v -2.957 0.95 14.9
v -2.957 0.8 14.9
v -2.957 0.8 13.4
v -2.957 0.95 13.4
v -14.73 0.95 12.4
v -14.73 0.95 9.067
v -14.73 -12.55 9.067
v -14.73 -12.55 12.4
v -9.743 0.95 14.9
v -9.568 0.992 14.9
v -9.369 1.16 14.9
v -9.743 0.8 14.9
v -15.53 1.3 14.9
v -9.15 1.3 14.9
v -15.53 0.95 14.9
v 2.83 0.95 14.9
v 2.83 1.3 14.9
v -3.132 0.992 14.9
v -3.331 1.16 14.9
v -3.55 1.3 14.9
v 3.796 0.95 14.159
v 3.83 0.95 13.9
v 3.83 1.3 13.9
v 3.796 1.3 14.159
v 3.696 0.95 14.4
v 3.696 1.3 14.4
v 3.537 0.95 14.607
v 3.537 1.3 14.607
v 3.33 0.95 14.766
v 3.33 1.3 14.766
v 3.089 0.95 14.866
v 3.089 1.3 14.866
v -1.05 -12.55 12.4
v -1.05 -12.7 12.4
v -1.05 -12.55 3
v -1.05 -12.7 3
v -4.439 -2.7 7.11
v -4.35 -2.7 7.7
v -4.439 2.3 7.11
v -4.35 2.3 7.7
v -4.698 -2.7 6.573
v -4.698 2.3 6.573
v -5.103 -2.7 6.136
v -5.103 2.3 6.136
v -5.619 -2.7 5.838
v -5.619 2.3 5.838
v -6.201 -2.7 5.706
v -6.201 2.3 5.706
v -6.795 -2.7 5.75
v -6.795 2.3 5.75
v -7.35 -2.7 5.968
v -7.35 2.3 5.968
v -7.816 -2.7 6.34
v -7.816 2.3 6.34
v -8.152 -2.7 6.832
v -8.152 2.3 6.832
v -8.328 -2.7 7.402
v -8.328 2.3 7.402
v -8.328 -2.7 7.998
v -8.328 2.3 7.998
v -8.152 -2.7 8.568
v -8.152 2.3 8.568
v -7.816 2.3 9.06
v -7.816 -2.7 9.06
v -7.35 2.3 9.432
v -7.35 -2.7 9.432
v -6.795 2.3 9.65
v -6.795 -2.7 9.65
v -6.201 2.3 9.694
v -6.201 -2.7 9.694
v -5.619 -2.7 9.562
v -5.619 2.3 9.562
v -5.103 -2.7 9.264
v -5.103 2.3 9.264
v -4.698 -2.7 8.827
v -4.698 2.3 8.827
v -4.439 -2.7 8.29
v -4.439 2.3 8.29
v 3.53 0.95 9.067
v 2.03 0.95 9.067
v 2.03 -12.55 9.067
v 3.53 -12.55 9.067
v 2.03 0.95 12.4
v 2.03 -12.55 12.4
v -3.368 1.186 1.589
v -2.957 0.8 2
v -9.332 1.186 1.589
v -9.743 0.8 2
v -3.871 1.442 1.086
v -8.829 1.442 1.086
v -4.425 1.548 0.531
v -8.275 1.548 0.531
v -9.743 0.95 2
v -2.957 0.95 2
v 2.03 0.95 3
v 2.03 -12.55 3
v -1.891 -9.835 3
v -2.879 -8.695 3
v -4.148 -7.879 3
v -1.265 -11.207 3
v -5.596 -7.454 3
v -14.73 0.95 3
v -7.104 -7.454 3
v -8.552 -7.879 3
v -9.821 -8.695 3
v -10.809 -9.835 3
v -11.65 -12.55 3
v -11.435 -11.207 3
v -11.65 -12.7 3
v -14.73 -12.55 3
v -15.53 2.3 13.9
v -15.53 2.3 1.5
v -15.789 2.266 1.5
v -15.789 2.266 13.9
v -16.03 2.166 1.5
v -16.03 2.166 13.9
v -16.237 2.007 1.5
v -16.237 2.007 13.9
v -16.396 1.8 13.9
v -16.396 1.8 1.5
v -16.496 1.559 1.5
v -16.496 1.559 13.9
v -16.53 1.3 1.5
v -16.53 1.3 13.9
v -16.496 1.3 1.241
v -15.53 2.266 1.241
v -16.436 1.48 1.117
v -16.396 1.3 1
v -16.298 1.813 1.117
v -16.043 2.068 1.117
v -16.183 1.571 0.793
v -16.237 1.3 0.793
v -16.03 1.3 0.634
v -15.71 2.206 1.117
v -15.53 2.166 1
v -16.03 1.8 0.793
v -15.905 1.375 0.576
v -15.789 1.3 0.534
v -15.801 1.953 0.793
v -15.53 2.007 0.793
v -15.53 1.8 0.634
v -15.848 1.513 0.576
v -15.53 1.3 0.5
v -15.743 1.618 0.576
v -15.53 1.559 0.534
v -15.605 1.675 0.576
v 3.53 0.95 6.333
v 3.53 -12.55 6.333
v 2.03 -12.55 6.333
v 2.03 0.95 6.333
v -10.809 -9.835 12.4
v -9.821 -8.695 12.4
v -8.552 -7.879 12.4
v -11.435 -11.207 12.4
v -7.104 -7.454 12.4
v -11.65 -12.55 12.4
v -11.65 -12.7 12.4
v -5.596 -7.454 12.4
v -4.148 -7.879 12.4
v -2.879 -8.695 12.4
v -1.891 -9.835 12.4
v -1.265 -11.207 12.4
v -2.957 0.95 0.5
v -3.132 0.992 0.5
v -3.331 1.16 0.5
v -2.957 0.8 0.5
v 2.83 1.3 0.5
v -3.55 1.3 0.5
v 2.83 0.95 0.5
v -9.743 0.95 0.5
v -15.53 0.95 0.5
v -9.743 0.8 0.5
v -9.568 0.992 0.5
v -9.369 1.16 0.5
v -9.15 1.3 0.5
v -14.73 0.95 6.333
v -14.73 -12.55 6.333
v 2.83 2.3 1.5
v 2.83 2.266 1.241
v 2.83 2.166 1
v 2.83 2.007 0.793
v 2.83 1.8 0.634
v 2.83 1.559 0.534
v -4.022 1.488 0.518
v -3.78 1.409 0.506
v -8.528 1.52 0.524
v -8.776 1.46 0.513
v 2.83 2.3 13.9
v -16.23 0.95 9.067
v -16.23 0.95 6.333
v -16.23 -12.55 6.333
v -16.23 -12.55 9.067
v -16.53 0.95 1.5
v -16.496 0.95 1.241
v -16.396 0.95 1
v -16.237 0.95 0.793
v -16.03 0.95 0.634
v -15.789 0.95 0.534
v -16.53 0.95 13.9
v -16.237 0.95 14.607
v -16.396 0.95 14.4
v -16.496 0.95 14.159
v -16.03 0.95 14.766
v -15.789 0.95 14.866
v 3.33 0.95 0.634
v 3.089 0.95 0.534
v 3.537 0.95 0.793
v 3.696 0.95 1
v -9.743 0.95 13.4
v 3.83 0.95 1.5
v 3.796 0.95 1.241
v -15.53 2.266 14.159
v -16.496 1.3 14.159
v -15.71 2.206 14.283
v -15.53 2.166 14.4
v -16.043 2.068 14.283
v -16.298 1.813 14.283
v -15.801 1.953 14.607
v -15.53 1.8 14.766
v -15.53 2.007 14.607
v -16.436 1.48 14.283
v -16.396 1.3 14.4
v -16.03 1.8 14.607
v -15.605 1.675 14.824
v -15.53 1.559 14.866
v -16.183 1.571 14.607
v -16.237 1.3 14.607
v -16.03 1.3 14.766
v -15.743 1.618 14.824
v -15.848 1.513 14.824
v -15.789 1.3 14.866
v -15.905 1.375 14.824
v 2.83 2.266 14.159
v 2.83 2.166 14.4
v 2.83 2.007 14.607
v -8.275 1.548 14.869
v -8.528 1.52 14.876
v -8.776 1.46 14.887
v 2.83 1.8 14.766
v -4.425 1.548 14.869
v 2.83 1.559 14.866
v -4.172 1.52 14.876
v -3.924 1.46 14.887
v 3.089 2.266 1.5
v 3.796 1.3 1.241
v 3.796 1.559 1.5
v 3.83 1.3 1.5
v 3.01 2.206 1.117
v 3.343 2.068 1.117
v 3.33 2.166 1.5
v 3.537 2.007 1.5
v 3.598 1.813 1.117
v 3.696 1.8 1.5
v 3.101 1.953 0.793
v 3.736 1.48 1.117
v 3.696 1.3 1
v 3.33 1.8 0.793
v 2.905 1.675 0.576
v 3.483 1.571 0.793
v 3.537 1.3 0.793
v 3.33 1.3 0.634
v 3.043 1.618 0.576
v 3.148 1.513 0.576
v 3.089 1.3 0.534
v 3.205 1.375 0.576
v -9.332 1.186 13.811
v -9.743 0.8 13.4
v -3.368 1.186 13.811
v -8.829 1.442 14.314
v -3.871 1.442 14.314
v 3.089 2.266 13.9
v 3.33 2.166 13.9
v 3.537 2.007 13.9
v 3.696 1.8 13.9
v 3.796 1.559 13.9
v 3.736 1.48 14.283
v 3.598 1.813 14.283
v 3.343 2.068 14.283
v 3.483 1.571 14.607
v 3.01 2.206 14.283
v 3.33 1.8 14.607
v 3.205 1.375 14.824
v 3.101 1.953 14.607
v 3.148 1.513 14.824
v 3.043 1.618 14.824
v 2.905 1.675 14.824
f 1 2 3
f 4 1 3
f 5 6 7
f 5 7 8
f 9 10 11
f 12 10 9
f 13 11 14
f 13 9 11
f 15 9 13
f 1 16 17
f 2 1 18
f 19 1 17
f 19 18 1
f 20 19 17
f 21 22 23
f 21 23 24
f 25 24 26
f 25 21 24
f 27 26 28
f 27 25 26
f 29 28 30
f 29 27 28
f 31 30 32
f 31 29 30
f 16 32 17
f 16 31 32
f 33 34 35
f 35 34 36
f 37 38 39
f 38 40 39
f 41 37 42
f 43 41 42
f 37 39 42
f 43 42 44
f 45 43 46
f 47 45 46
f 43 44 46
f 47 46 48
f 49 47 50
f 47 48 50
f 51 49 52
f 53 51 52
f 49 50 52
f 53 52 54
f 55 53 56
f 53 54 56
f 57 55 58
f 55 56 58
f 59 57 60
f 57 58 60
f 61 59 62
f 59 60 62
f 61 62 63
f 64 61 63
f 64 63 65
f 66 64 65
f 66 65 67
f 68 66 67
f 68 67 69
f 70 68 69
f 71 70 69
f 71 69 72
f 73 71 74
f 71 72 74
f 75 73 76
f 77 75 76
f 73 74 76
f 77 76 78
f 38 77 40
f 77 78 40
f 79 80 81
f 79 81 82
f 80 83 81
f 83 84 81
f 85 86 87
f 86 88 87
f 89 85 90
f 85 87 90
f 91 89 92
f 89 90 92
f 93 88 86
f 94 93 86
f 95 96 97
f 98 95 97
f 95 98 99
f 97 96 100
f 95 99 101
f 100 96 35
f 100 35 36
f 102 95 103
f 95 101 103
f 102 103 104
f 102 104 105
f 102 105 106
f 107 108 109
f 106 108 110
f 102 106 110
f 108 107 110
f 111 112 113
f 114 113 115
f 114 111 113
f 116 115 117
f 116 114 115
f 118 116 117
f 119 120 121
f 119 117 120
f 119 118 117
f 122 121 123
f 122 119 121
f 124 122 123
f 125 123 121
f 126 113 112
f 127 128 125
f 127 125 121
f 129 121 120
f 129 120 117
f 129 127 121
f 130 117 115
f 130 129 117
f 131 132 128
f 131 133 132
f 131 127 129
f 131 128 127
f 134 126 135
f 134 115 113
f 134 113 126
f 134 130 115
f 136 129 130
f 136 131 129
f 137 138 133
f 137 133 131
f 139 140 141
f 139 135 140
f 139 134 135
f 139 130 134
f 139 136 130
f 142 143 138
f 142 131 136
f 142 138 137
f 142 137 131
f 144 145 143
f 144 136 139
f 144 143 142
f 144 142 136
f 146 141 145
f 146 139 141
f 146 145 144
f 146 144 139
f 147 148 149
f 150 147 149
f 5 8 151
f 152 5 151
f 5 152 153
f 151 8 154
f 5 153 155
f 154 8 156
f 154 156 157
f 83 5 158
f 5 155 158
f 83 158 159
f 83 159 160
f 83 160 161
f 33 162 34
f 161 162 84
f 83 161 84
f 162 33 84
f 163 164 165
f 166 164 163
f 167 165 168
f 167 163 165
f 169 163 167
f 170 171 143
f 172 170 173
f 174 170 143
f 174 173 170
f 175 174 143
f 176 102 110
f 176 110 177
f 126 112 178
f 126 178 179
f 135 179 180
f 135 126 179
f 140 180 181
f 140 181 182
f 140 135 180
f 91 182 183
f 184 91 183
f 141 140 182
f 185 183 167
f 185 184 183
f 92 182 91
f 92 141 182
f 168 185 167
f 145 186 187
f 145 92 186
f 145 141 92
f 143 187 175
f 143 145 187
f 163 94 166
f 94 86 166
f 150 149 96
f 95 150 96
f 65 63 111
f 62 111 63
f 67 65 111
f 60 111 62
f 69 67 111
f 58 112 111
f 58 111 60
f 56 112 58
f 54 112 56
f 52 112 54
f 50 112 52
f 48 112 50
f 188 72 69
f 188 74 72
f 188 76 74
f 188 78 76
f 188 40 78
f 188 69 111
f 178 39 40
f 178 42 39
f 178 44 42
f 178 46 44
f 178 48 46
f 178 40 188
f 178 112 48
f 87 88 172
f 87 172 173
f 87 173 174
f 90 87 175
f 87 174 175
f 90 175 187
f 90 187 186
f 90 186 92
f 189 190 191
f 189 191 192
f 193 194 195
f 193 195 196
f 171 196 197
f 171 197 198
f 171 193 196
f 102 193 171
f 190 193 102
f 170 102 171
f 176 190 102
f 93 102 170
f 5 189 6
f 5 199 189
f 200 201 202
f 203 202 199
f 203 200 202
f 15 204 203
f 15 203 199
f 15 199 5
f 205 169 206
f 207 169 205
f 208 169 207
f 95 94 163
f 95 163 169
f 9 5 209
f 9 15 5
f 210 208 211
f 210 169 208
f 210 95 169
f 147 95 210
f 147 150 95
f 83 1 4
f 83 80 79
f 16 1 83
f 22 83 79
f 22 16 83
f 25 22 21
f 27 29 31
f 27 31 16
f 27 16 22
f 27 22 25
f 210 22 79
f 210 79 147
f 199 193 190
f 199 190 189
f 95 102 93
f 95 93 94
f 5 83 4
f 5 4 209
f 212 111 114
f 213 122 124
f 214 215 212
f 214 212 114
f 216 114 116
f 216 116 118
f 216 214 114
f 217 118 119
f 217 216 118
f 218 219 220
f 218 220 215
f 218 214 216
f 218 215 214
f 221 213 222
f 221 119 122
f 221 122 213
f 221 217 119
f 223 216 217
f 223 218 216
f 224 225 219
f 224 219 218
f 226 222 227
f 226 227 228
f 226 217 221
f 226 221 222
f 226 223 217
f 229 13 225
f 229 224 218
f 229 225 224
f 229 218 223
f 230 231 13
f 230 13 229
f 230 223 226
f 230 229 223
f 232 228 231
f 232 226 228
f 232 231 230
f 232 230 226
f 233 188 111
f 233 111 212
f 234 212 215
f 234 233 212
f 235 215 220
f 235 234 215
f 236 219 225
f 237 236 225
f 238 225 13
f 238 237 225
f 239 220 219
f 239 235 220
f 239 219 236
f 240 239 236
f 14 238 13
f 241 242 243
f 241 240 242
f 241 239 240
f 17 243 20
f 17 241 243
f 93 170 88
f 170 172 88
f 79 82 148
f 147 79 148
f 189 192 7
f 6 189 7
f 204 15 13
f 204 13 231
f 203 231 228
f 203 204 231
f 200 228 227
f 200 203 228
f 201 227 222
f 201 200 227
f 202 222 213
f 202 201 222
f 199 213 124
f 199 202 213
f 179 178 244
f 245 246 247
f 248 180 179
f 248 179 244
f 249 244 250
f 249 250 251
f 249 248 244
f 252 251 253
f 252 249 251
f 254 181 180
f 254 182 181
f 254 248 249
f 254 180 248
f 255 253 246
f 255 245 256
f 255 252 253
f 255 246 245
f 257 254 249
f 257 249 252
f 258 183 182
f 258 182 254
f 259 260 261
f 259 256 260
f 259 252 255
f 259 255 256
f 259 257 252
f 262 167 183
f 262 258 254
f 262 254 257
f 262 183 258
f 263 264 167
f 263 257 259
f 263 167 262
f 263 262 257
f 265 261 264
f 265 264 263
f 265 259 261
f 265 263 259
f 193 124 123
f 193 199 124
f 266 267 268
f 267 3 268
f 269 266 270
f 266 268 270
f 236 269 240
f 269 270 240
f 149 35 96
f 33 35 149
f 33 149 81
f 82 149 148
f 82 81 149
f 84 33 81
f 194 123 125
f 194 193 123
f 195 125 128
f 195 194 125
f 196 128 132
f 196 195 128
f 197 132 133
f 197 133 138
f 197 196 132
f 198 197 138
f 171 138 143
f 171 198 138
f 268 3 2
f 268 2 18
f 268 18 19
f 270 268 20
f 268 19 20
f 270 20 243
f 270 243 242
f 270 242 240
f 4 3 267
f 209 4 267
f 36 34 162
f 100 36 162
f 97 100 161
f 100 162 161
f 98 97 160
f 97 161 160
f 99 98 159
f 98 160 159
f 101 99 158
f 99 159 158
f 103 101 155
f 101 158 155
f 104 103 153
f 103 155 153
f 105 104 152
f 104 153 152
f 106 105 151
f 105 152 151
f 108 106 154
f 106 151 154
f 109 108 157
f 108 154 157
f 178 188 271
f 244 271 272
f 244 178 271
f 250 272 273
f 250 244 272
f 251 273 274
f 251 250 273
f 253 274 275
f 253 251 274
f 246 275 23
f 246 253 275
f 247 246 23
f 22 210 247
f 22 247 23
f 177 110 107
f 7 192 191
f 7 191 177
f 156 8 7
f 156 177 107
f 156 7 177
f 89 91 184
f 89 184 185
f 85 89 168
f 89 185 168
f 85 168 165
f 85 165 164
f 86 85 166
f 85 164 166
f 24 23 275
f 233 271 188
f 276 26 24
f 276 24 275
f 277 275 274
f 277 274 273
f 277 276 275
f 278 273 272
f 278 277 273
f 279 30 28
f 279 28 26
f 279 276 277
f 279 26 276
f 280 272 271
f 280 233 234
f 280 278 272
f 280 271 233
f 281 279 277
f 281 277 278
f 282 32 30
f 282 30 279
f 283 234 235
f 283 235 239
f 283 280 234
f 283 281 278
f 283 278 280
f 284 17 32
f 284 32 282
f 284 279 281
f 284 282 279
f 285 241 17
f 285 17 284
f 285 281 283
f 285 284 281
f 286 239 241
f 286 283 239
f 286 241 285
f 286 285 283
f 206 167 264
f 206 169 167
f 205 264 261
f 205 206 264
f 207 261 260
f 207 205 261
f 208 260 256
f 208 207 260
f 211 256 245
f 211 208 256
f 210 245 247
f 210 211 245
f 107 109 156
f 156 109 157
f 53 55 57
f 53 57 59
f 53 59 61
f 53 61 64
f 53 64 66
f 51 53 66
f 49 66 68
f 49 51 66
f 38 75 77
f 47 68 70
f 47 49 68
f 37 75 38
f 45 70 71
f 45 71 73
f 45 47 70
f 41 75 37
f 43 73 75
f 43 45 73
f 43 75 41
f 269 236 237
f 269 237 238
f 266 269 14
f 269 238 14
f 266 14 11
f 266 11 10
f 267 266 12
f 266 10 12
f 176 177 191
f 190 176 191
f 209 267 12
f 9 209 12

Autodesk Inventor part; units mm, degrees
ref_plane "YZ Plane" through (0, 0, 0) normal (1, 0, 0) x (0, 1, 0)
ref_plane "XZ Plane" through (0, 0, 0) normal (0, 1, 0) x (-1, 0, 0)
ref_plane "Work Plane8" through (7.15, 0.8, 25.4) normal (0, 1, 0) x (1, 0, 0)
sketch "Sketch21" plane through (7.15, 0.8, 25.4) normal (0, 1, 0) x (1, 0, 0)
  line L0 (-3, 3) -> (-24, 3)
  line L1 (-3, 197) -> (-3, 3)
  line L2 (-24, 197) -> (-3, 197)
  line L3 (-24, 3) -> (-24, 197)
  line L4 (-4.819988, 19.366667) -> (-3.319988, 19.366667)
  line L5 (-3.319988, 19.366667) -> (-3.319988, 16.033333)
  line L6 (-3.319988, 16.033333) -> (-4.819988, 16.033333)
  line L7 (-4.819988, 16.033333) -> (-4.819988, 12.7)
  line L8 (-4.819988, 12.7) -> (-22.180012, 12.7)
  line L9 (-22.180012, 12.7) -> (-22.180012, 16.033333)
  line L10 (-22.180012, 16.033333) -> (-23.680012, 16.033333)
  line L11 (-23.680012, 16.033333) -> (-23.680012, 19.366667)
  line L12 (-23.680012, 19.366667) -> (-22.180012, 19.366667)
  line L13 (-22.180012, 19.366667) -> (-22.180012, 22.7)
  line L14 (-22.180012, 22.7) -> (-4.819988, 22.7)
  line L15 (-4.819988, 22.7) -> (-4.819988, 19.366667)
  line L16 (-21.880012, 22.4) -> (-21.880012, 19.066667)
  line L17 (-21.880012, 19.066667) -> (-23.380012, 19.066667)
  line L18 (-23.380012, 19.066667) -> (-23.380012, 16.333333)
  line L19 (-23.380012, 16.333333) -> (-21.880012, 16.333333)
  line L20 (-21.880012, 16.333333) -> (-21.880012, 13)
  line L21 (-21.880012, 13) -> (-5.119988, 13)
  line L22 (-5.119988, 13) -> (-5.119988, 16.333333)
  line L23 (-5.119988, 16.333333) -> (-3.619988, 16.333333)
  line L24 (-3.619988, 16.333333) -> (-3.619988, 19.066667)
  line L25 (-3.619988, 19.066667) -> (-5.119988, 19.066667)
  line L26 (-5.119988, 19.066667) -> (-5.119988, 22.4)
  line L27 (-5.119988, 22.4) -> (-21.880012, 22.4)
  point P0 (-7.15, 25.4)
  dimension "d99" = 0.3
  dimension "d100" = 0.3
  dimension "d101" = 0.3
  dimension "d102" = 0.3
  dimension "d103" = 0.3
  dimension "d104" = 0.3
  dimension "d105" = 0.3
  dimension "d106" = 0.3
  dimension "d107" = 0.3
  dimension "d108" = 0.3
  dimension "d109" = 0.3
  dimension "d110" = 0.3
ref_plane "Work Plane9" through (-1.05, -12.7, 2.7) normal (0, 1, 0) x (0, 0, 1)
sketch "Sketch21 outline for Extrusion20" plane through (7.15, 0.8, 25.4) normal (0, 1, 0) x (1, 0, 0)
  line L0 (-5.119988, 22.4) -> (-21.880012, 22.4)
  line L1 (-5.119988, 19.066667) -> (-5.119988, 22.4)
  line L2 (-3.619988, 19.066667) -> (-5.119988, 19.066667)
  line L3 (-3.619988, 16.333333) -> (-3.619988, 19.066667)
  line L4 (-5.119988, 16.333333) -> (-3.619988, 16.333333)
  line L5 (-5.119988, 13) -> (-5.119988, 16.333333)
  line L6 (-21.880012, 13) -> (-5.119988, 13)
  line L7 (-21.880012, 16.333333) -> (-21.880012, 13)
  line L8 (-23.380012, 16.333333) -> (-21.880012, 16.333333)
  line L9 (-23.380012, 19.066667) -> (-23.380012, 16.333333)
  line L10 (-21.880012, 19.066667) -> (-23.380012, 19.066667)
  line L11 (-21.880012, 22.4) -> (-21.880012, 19.066667)
extrude "Extrusion20" add sketch "Sketch21 outline for Extrusion20" against normal up to surface (13.5 mm away)
sketch "Sketch22" plane through (-14.730012, 0.8, 12.4) normal (0, 0, 1) x (1, 0, 0)
  circle A0 centre (8.380012, -13.5) radius 5 construction
  arc A1 (3.080012, -13.5) -> (13.680012, -13.5) centre (8.380012, -13.5) ccw
  arc A2 (13.680012, -13.5) -> (3.080012, -13.5) centre (8.380012, -13.5) ccw
  point P0 (14.730012, -0.8)
sketch "Sketch22 outline for Extrusion21" plane through (-14.730012, 0.8, 12.4) normal (0, 0, 1) x (1, 0, 0)
  arc A0 (13.680012, -13.5) -> (3.080012, -13.5) centre (8.380012, -13.5) ccw
  arc A1 (3.080012, -13.5) -> (13.680012, -13.5) centre (8.380012, -13.5) ccw
extrude "Extrusion21" cut sketch "Sketch22 outline for Extrusion21" against normal through all
sketch "Sketch23" plane through (7.15, 0.8, 25.4) normal (0, 1, 0) x (1, 0, 0)
  line L0 (-21.880012, 22.4) -> (-21.880012, 19.066667)
  line L1 (-21.880012, 19.066667) -> (-23.380012, 19.066667)
  line L2 (-23.380012, 19.066667) -> (-23.380012, 16.333333)
  line L3 (-23.380012, 16.333333) -> (-21.880012, 16.333333)
  line L4 (-21.880012, 16.333333) -> (-21.880012, 13)
  line L5 (-21.880012, 13) -> (-5.119988, 13)
  line L6 (-5.119988, 13) -> (-5.119988, 16.333333)
  line L7 (-5.119988, 16.333333) -> (-3.619988, 16.333333)
  line L8 (-3.619988, 16.333333) -> (-3.619988, 19.066667)
  line L9 (-3.619988, 19.066667) -> (-5.119988, 19.066667)
  line L10 (-5.119988, 19.066667) -> (-5.119988, 22.4)
  line L11 (-5.119988, 22.4) -> (-21.880012, 22.4)
  line L12 (-24, 3) -> (-24, 197)
  line L13 (-3, 197) -> (-3, 3)
  line L14 (-23.680012, 24.9) -> (-3.319988, 24.9)
  line L15 (-3.319988, 24.9) -> (-3.319988, 10.5)
  line L16 (-3.319988, 10.5) -> (-23.680012, 10.5)
  line L17 (-23.680012, 10.5) -> (-23.680012, 24.9)
  point P0 (-7.15, 25.4)
  dimension "d115" = 2.5
  dimension "d116" = 2.5
  dimension "d117" = 0.3
  dimension "d118" = 0.3
sketch "Sketch23 outline for Extrusion22" plane through (7.15, 0.8, 25.4) normal (0, 1, 0) x (1, 0, 0)
  line L0 (-23.680012, 24.9) -> (-3.319988, 24.9)
  line L1 (-3.319988, 24.9) -> (-3.319988, 10.5)
  line L2 (-3.319988, 10.5) -> (-23.680012, 10.5)
  line L3 (-23.680012, 10.5) -> (-23.680012, 24.9)
extrude "Extrusion22" add sketch "Sketch23 outline for Extrusion22" along normal blind 1.5
sketch "Sketch24" plane through (-16.530012, 0.8, 14.9) normal (0, 0, 1) x (1, 0, 0)
  line L0 (20.360025, 1.5) -> (0, 1.5)
  line L1 (0, 0) -> (0, 1.5)
  line L2 (20.360025, 0) -> (0, 0)
  line L3 (20.360025, 0) -> (20.360025, 1.5)
  line L4 (6.786675, 0) -> (13.57335, 0)
  line L5 (13.57335, 0) -> (13.57335, 0.75)
  line L6 (13.57335, 0.75) -> (6.786675, 0.75)
  line L7 (6.786675, 0.75) -> (6.786675, 0)
  point P0 (16.530012, -0.8)
  dimension "d121" = 20.36002
  dimension "d122" = 6.78667
  dimension "d123" = 6.78667
  dimension "d124" = 0.75
  dimension "d125" = 1.5
sketch "Sketch24 outline for Extrusion23" plane through (-16.530012, 0.8, 14.9) normal (0, 0, 1) x (1, 0, 0)
  line L0 (6.786675, 0.75) -> (6.786675, 0)
  line L1 (13.57335, 0.75) -> (6.786675, 0.75)
  line L2 (13.57335, 0) -> (13.57335, 0.75)
  line L3 (6.786675, 0) -> (13.57335, 0)
extrude "Extrusion23" cut sketch "Sketch24 outline for Extrusion23" against normal blind 1.5
sketch "Sketch25" plane through (3.830012, 0.8, 0.5) normal (0, 0, -1) x (-1, 0, 0)
  line L0 (6.786675, 0.75) -> (6.786675, 0)
  line L1 (13.57335, 0.75) -> (6.786675, 0.75)
  line L2 (13.57335, 0) -> (13.57335, 0.75)
  line L3 (20.360025, 0) -> (0, 0)
  point P0 (3.830012, -0.8)
fillet "Fillet13" radius 2 3 edges at (-9.7433, 1.55, 14.15) (-2.9567, 1.55, 14.15) (-6.35, 1.55, 13.4)
sketch "Sketch25 outline for Extrusion24" plane through (3.830012, 0.8, 0.5) normal (0, 0, -1) x (-1, 0, 0)
  line L0 (13.57335, 0.75) -> (6.786675, 0.75)
  line L1 (13.57335, 0) -> (13.57335, 0.75)
  line L2 (6.786675, 0) -> (13.57335, 0)
  line L3 (6.786675, 0.75) -> (6.786675, 0)
extrude "Extrusion24" cut sketch "Sketch25 outline for Extrusion24" against normal blind 1.5
fillet "Fillet14" radius 2 3 edges at (-2.9567, 1.55, 1.25) (-9.7433, 1.55, 1.25) (-6.35, 1.55, 2)
fillet "Fillet15" radius 1 8 edges at (-6.35, 2.3, 0.5) (3.83, 2.3, 7.7) (-6.35, 2.3, 14.9) (-16.53, 2.3, 7.7) (3.83, 1.55, 0.5) (3.83, 1.55, 14.9) (-16.53, 1.55, 0.5) (-16.53, 1.55, 14.9)
sketch "Sketch26" plane through (-16.230012, -12.7, 9.066667) normal (0, -1, 0) x (1, 0, 0)
  line L0 (4.580012, -6.066667) -> (4.580012, 3.333333)
  line L1 (4.580012, 3.333333) -> (1.5, 3.333333)
  line L2 (1.5, 3.333333) -> (1.5, 0)
  line L3 (1.5, 0) -> (0, 0)
  line L4 (0, 0) -> (0, -2.733333)
  line L5 (0, -2.733333) -> (1.5, -2.733333)
  line L6 (1.5, -2.733333) -> (1.5, -6.066667)
  line L7 (1.5, -6.066667) -> (4.580012, -6.066667)
  line L8 (15.180012, 3.333333) -> (15.180012, -6.066667)
  line L9 (15.180012, -6.066667) -> (18.260025, -6.066667)
  line L10 (18.260025, -6.066667) -> (18.260025, -2.733333)
  line L11 (18.260025, -2.733333) -> (19.760025, -2.733333)
  line L12 (19.760025, -2.733333) -> (19.760025, 0)
  line L13 (19.760025, 0) -> (18.260025, 0)
  line L14 (18.260025, 0) -> (18.260025, 3.333333)
  line L15 (18.260025, 3.333333) -> (15.180012, 3.333333)
  point P0 (16.230012, -9.066667)
sketch "Sketch26 outline for Extrusion25" plane through (-16.230012, -12.7, 9.066667) normal (0, -1, 0) x (1, 0, 0)
  line L0 (1.5, -6.066667) -> (4.580012, -6.066667)
  line L1 (1.5, -2.733333) -> (1.5, -6.066667)
  line L2 (0, -2.733333) -> (1.5, -2.733333)
  line L3 (0, 0) -> (0, -2.733333)
  line L4 (1.5, 0) -> (0, 0)
  line L5 (1.5, 3.333333) -> (1.5, 0)
  line L6 (4.580012, 3.333333) -> (1.5, 3.333333)
  line L7 (4.580012, -6.066667) -> (4.580012, 3.333333)
  line L8 (18.260025, 3.333333) -> (15.180012, 3.333333)
  line L9 (18.260025, 0) -> (18.260025, 3.333333)
  line L10 (19.760025, 0) -> (18.260025, 0)
  line L11 (19.760025, -2.733333) -> (19.760025, 0)
  line L12 (18.260025, -2.733333) -> (19.760025, -2.733333)
  line L13 (18.260025, -6.066667) -> (18.260025, -2.733333)
  line L14 (15.180012, -6.066667) -> (18.260025, -6.066667)
  line L15 (15.180012, 3.333333) -> (15.180012, -6.066667)
extrude "Extrusion25" cut sketch "Sketch26 outline for Extrusion25" against normal blind 0.15
sketch "Sketch27" plane through (7.15, 0.8, 25.4) normal (0, -1, 0) x (1, 0, 0)
  line L0 (-3.619988, -16.333333) -> (-3.619988, -19.066667)
  line L1 (-3.619988, -19.066667) -> (-5.119988, -19.066667)
  line L2 (-5.119988, -19.066667) -> (-5.119988, -22.4)
  line L3 (-5.119988, -22.4) -> (-21.880012, -22.4)
  line L4 (-21.880012, -22.4) -> (-21.880012, -19.066667)
  line L5 (-21.880012, -19.066667) -> (-23.380012, -19.066667)
  line L6 (-23.380012, -19.066667) -> (-23.380012, -16.333333)
  line L7 (-23.380012, -16.333333) -> (-21.880012, -16.333333)
  line L8 (-21.880012, -16.333333) -> (-21.880012, -13)
  line L9 (-21.880012, -13) -> (-5.119988, -13)
  line L10 (-5.119988, -13) -> (-5.119988, -16.333333)
  line L11 (-5.119988, -16.333333) -> (-3.619988, -16.333333)
  arc A0 (-22.680012, -10.5) -> (-23.680012, -11.5) centre (-22.680012, -11.5) ccw
  line L12 (-23.680012, -11.5) -> (-23.680012, -23.9)
  arc A1 (-23.680012, -23.9) -> (-22.680012, -24.9) centre (-22.680012, -23.9) ccw
  line L13 (-22.680012, -24.9) -> (-16.893337, -24.9)
  line L14 (-16.893337, -24.9) -> (-16.893337, -23.4)
  line L15 (-16.893337, -23.4) -> (-10.106663, -23.4)
  line L16 (-10.106663, -23.4) -> (-10.106663, -24.9)
  line L17 (-10.106663, -24.9) -> (-4.319988, -24.9)
  arc A2 (-4.319988, -24.9) -> (-3.319988, -23.9) centre (-4.319988, -23.9) ccw
  line L18 (-3.319988, -23.9) -> (-3.319988, -11.5)
  arc A3 (-3.319988, -11.5) -> (-4.319988, -10.5) centre (-4.319988, -11.5) ccw
  line L19 (-4.319988, -10.5) -> (-10.106663, -10.5)
  line L20 (-10.106663, -10.5) -> (-10.106663, -12)
  line L21 (-10.106663, -12) -> (-16.893337, -12)
  line L22 (-16.893337, -12) -> (-16.893337, -10.5)
  line L23 (-16.893337, -10.5) -> (-22.680012, -10.5)
  point P0 (-7.15, -25.4)
sketch "Sketch27 outline for Extrusion26" plane through (7.15, 0.8, 25.4) normal (0, -1, 0) x (1, 0, 0)
  line L0 (-16.893337, -10.5) -> (-22.680012, -10.5)
  line L1 (-16.893337, -12) -> (-16.893337, -10.5)
  arc A0 (-22.680012, -10.5) -> (-23.680012, -11.5) centre (-22.680012, -11.5) ccw
  line L2 (-10.106663, -12) -> (-16.893337, -12)
  line L3 (-23.680012, -11.5) -> (-23.680012, -23.9)
  line L4 (-10.106663, -10.5) -> (-10.106663, -12)
  arc A1 (-23.680012, -23.9) -> (-22.680012, -24.9) centre (-22.680012, -23.9) ccw
  line L5 (-4.319988, -10.5) -> (-10.106663, -10.5)
  line L6 (-22.680012, -24.9) -> (-16.893337, -24.9)
  arc A2 (-3.319988, -11.5) -> (-4.319988, -10.5) centre (-4.319988, -11.5) ccw
  line L7 (-16.893337, -24.9) -> (-16.893337, -23.4)
  line L8 (-3.319988, -23.9) -> (-3.319988, -11.5)
  line L9 (-16.893337, -23.4) -> (-10.106663, -23.4)
  arc A3 (-4.319988, -24.9) -> (-3.319988, -23.9) centre (-4.319988, -23.9) ccw
  line L10 (-10.106663, -23.4) -> (-10.106663, -24.9)
  line L11 (-10.106663, -24.9) -> (-4.319988, -24.9)
  line L12 (-5.119988, -16.333333) -> (-3.619988, -16.333333)
  line L13 (-5.119988, -13) -> (-5.119988, -16.333333)
  line L14 (-21.880012, -13) -> (-5.119988, -13)
  line L15 (-21.880012, -16.333333) -> (-21.880012, -13)
  line L16 (-23.380012, -16.333333) -> (-21.880012, -16.333333)
  line L17 (-23.380012, -19.066667) -> (-23.380012, -16.333333)
  line L18 (-21.880012, -19.066667) -> (-23.380012, -19.066667)
  line L19 (-21.880012, -22.4) -> (-21.880012, -19.066667)
  line L20 (-5.119988, -22.4) -> (-21.880012, -22.4)
  line L21 (-5.119988, -19.066667) -> (-5.119988, -22.4)
  line L22 (-3.619988, -19.066667) -> (-5.119988, -19.066667)
  line L23 (-3.619988, -16.333333) -> (-3.619988, -19.066667)
extrude "Extrusion26" cut sketch "Sketch27 outline for Extrusion26" against normal blind 0.15
sketch "Sketch28" plane through (7.15, 2.3, 25.4) normal (0, 1, 0) x (1, 0, 0)
  circle A0 centre (-13.5, 17.7) radius 2
  point P0 (-7.15, 25.4)
sketch "Sketch28 outline for Extrusion27" plane through (7.15, 2.3, 25.4) normal (0, 1, 0) x (1, 0, 0)
  circle A0 centre (-13.5, 17.7) radius 2
extrude "Extrusion27" cut sketch "Sketch28 outline for Extrusion27" against normal blind 5
equation "\"d100\" = d99"
equation "\"d101\" = d99"
equation "\"d102\" = d101"
equation "\"d103\" = d102"
equation "\"d104\" = d102"
equation "\"d105\" = d104"
equation "\"d106\" = d105"
equation "\"d107\" = d106"
equation "\"d108\" = d106"
equation "\"d109\" = d107"
equation "\"d110\" = d109"
equation "\"d116\" = d115"
equation "\"d118\" = d117"
equation "\"d122\" = 0.333333 * d121"
equation "\"d123\" = d122"
equation "\"d124\" = 0.5 * d125"
properties part number "InternalKey"
